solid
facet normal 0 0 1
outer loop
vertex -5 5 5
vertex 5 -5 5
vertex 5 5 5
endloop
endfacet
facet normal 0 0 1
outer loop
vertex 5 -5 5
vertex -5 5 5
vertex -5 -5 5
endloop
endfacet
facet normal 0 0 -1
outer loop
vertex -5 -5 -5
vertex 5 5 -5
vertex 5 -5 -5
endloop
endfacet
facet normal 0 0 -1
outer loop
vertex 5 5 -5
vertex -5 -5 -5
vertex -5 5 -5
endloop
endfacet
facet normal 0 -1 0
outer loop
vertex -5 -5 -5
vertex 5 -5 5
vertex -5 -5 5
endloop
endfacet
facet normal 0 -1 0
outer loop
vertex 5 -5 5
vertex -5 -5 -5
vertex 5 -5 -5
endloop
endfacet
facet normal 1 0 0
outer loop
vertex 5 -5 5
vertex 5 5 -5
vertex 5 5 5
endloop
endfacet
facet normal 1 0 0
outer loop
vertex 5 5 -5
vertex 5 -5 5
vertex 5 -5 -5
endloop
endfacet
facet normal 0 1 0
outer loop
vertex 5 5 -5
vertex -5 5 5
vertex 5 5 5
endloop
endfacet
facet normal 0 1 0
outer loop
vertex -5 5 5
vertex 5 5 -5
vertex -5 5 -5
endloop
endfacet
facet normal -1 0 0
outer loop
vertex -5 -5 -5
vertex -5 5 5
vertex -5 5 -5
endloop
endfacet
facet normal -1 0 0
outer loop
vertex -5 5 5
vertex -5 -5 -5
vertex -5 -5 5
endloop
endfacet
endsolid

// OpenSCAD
$fn = 20;
cube([10, 10, 10], center = true);
translate([0, 0, 10]) text("Hi", size = 5, halign = "center");
